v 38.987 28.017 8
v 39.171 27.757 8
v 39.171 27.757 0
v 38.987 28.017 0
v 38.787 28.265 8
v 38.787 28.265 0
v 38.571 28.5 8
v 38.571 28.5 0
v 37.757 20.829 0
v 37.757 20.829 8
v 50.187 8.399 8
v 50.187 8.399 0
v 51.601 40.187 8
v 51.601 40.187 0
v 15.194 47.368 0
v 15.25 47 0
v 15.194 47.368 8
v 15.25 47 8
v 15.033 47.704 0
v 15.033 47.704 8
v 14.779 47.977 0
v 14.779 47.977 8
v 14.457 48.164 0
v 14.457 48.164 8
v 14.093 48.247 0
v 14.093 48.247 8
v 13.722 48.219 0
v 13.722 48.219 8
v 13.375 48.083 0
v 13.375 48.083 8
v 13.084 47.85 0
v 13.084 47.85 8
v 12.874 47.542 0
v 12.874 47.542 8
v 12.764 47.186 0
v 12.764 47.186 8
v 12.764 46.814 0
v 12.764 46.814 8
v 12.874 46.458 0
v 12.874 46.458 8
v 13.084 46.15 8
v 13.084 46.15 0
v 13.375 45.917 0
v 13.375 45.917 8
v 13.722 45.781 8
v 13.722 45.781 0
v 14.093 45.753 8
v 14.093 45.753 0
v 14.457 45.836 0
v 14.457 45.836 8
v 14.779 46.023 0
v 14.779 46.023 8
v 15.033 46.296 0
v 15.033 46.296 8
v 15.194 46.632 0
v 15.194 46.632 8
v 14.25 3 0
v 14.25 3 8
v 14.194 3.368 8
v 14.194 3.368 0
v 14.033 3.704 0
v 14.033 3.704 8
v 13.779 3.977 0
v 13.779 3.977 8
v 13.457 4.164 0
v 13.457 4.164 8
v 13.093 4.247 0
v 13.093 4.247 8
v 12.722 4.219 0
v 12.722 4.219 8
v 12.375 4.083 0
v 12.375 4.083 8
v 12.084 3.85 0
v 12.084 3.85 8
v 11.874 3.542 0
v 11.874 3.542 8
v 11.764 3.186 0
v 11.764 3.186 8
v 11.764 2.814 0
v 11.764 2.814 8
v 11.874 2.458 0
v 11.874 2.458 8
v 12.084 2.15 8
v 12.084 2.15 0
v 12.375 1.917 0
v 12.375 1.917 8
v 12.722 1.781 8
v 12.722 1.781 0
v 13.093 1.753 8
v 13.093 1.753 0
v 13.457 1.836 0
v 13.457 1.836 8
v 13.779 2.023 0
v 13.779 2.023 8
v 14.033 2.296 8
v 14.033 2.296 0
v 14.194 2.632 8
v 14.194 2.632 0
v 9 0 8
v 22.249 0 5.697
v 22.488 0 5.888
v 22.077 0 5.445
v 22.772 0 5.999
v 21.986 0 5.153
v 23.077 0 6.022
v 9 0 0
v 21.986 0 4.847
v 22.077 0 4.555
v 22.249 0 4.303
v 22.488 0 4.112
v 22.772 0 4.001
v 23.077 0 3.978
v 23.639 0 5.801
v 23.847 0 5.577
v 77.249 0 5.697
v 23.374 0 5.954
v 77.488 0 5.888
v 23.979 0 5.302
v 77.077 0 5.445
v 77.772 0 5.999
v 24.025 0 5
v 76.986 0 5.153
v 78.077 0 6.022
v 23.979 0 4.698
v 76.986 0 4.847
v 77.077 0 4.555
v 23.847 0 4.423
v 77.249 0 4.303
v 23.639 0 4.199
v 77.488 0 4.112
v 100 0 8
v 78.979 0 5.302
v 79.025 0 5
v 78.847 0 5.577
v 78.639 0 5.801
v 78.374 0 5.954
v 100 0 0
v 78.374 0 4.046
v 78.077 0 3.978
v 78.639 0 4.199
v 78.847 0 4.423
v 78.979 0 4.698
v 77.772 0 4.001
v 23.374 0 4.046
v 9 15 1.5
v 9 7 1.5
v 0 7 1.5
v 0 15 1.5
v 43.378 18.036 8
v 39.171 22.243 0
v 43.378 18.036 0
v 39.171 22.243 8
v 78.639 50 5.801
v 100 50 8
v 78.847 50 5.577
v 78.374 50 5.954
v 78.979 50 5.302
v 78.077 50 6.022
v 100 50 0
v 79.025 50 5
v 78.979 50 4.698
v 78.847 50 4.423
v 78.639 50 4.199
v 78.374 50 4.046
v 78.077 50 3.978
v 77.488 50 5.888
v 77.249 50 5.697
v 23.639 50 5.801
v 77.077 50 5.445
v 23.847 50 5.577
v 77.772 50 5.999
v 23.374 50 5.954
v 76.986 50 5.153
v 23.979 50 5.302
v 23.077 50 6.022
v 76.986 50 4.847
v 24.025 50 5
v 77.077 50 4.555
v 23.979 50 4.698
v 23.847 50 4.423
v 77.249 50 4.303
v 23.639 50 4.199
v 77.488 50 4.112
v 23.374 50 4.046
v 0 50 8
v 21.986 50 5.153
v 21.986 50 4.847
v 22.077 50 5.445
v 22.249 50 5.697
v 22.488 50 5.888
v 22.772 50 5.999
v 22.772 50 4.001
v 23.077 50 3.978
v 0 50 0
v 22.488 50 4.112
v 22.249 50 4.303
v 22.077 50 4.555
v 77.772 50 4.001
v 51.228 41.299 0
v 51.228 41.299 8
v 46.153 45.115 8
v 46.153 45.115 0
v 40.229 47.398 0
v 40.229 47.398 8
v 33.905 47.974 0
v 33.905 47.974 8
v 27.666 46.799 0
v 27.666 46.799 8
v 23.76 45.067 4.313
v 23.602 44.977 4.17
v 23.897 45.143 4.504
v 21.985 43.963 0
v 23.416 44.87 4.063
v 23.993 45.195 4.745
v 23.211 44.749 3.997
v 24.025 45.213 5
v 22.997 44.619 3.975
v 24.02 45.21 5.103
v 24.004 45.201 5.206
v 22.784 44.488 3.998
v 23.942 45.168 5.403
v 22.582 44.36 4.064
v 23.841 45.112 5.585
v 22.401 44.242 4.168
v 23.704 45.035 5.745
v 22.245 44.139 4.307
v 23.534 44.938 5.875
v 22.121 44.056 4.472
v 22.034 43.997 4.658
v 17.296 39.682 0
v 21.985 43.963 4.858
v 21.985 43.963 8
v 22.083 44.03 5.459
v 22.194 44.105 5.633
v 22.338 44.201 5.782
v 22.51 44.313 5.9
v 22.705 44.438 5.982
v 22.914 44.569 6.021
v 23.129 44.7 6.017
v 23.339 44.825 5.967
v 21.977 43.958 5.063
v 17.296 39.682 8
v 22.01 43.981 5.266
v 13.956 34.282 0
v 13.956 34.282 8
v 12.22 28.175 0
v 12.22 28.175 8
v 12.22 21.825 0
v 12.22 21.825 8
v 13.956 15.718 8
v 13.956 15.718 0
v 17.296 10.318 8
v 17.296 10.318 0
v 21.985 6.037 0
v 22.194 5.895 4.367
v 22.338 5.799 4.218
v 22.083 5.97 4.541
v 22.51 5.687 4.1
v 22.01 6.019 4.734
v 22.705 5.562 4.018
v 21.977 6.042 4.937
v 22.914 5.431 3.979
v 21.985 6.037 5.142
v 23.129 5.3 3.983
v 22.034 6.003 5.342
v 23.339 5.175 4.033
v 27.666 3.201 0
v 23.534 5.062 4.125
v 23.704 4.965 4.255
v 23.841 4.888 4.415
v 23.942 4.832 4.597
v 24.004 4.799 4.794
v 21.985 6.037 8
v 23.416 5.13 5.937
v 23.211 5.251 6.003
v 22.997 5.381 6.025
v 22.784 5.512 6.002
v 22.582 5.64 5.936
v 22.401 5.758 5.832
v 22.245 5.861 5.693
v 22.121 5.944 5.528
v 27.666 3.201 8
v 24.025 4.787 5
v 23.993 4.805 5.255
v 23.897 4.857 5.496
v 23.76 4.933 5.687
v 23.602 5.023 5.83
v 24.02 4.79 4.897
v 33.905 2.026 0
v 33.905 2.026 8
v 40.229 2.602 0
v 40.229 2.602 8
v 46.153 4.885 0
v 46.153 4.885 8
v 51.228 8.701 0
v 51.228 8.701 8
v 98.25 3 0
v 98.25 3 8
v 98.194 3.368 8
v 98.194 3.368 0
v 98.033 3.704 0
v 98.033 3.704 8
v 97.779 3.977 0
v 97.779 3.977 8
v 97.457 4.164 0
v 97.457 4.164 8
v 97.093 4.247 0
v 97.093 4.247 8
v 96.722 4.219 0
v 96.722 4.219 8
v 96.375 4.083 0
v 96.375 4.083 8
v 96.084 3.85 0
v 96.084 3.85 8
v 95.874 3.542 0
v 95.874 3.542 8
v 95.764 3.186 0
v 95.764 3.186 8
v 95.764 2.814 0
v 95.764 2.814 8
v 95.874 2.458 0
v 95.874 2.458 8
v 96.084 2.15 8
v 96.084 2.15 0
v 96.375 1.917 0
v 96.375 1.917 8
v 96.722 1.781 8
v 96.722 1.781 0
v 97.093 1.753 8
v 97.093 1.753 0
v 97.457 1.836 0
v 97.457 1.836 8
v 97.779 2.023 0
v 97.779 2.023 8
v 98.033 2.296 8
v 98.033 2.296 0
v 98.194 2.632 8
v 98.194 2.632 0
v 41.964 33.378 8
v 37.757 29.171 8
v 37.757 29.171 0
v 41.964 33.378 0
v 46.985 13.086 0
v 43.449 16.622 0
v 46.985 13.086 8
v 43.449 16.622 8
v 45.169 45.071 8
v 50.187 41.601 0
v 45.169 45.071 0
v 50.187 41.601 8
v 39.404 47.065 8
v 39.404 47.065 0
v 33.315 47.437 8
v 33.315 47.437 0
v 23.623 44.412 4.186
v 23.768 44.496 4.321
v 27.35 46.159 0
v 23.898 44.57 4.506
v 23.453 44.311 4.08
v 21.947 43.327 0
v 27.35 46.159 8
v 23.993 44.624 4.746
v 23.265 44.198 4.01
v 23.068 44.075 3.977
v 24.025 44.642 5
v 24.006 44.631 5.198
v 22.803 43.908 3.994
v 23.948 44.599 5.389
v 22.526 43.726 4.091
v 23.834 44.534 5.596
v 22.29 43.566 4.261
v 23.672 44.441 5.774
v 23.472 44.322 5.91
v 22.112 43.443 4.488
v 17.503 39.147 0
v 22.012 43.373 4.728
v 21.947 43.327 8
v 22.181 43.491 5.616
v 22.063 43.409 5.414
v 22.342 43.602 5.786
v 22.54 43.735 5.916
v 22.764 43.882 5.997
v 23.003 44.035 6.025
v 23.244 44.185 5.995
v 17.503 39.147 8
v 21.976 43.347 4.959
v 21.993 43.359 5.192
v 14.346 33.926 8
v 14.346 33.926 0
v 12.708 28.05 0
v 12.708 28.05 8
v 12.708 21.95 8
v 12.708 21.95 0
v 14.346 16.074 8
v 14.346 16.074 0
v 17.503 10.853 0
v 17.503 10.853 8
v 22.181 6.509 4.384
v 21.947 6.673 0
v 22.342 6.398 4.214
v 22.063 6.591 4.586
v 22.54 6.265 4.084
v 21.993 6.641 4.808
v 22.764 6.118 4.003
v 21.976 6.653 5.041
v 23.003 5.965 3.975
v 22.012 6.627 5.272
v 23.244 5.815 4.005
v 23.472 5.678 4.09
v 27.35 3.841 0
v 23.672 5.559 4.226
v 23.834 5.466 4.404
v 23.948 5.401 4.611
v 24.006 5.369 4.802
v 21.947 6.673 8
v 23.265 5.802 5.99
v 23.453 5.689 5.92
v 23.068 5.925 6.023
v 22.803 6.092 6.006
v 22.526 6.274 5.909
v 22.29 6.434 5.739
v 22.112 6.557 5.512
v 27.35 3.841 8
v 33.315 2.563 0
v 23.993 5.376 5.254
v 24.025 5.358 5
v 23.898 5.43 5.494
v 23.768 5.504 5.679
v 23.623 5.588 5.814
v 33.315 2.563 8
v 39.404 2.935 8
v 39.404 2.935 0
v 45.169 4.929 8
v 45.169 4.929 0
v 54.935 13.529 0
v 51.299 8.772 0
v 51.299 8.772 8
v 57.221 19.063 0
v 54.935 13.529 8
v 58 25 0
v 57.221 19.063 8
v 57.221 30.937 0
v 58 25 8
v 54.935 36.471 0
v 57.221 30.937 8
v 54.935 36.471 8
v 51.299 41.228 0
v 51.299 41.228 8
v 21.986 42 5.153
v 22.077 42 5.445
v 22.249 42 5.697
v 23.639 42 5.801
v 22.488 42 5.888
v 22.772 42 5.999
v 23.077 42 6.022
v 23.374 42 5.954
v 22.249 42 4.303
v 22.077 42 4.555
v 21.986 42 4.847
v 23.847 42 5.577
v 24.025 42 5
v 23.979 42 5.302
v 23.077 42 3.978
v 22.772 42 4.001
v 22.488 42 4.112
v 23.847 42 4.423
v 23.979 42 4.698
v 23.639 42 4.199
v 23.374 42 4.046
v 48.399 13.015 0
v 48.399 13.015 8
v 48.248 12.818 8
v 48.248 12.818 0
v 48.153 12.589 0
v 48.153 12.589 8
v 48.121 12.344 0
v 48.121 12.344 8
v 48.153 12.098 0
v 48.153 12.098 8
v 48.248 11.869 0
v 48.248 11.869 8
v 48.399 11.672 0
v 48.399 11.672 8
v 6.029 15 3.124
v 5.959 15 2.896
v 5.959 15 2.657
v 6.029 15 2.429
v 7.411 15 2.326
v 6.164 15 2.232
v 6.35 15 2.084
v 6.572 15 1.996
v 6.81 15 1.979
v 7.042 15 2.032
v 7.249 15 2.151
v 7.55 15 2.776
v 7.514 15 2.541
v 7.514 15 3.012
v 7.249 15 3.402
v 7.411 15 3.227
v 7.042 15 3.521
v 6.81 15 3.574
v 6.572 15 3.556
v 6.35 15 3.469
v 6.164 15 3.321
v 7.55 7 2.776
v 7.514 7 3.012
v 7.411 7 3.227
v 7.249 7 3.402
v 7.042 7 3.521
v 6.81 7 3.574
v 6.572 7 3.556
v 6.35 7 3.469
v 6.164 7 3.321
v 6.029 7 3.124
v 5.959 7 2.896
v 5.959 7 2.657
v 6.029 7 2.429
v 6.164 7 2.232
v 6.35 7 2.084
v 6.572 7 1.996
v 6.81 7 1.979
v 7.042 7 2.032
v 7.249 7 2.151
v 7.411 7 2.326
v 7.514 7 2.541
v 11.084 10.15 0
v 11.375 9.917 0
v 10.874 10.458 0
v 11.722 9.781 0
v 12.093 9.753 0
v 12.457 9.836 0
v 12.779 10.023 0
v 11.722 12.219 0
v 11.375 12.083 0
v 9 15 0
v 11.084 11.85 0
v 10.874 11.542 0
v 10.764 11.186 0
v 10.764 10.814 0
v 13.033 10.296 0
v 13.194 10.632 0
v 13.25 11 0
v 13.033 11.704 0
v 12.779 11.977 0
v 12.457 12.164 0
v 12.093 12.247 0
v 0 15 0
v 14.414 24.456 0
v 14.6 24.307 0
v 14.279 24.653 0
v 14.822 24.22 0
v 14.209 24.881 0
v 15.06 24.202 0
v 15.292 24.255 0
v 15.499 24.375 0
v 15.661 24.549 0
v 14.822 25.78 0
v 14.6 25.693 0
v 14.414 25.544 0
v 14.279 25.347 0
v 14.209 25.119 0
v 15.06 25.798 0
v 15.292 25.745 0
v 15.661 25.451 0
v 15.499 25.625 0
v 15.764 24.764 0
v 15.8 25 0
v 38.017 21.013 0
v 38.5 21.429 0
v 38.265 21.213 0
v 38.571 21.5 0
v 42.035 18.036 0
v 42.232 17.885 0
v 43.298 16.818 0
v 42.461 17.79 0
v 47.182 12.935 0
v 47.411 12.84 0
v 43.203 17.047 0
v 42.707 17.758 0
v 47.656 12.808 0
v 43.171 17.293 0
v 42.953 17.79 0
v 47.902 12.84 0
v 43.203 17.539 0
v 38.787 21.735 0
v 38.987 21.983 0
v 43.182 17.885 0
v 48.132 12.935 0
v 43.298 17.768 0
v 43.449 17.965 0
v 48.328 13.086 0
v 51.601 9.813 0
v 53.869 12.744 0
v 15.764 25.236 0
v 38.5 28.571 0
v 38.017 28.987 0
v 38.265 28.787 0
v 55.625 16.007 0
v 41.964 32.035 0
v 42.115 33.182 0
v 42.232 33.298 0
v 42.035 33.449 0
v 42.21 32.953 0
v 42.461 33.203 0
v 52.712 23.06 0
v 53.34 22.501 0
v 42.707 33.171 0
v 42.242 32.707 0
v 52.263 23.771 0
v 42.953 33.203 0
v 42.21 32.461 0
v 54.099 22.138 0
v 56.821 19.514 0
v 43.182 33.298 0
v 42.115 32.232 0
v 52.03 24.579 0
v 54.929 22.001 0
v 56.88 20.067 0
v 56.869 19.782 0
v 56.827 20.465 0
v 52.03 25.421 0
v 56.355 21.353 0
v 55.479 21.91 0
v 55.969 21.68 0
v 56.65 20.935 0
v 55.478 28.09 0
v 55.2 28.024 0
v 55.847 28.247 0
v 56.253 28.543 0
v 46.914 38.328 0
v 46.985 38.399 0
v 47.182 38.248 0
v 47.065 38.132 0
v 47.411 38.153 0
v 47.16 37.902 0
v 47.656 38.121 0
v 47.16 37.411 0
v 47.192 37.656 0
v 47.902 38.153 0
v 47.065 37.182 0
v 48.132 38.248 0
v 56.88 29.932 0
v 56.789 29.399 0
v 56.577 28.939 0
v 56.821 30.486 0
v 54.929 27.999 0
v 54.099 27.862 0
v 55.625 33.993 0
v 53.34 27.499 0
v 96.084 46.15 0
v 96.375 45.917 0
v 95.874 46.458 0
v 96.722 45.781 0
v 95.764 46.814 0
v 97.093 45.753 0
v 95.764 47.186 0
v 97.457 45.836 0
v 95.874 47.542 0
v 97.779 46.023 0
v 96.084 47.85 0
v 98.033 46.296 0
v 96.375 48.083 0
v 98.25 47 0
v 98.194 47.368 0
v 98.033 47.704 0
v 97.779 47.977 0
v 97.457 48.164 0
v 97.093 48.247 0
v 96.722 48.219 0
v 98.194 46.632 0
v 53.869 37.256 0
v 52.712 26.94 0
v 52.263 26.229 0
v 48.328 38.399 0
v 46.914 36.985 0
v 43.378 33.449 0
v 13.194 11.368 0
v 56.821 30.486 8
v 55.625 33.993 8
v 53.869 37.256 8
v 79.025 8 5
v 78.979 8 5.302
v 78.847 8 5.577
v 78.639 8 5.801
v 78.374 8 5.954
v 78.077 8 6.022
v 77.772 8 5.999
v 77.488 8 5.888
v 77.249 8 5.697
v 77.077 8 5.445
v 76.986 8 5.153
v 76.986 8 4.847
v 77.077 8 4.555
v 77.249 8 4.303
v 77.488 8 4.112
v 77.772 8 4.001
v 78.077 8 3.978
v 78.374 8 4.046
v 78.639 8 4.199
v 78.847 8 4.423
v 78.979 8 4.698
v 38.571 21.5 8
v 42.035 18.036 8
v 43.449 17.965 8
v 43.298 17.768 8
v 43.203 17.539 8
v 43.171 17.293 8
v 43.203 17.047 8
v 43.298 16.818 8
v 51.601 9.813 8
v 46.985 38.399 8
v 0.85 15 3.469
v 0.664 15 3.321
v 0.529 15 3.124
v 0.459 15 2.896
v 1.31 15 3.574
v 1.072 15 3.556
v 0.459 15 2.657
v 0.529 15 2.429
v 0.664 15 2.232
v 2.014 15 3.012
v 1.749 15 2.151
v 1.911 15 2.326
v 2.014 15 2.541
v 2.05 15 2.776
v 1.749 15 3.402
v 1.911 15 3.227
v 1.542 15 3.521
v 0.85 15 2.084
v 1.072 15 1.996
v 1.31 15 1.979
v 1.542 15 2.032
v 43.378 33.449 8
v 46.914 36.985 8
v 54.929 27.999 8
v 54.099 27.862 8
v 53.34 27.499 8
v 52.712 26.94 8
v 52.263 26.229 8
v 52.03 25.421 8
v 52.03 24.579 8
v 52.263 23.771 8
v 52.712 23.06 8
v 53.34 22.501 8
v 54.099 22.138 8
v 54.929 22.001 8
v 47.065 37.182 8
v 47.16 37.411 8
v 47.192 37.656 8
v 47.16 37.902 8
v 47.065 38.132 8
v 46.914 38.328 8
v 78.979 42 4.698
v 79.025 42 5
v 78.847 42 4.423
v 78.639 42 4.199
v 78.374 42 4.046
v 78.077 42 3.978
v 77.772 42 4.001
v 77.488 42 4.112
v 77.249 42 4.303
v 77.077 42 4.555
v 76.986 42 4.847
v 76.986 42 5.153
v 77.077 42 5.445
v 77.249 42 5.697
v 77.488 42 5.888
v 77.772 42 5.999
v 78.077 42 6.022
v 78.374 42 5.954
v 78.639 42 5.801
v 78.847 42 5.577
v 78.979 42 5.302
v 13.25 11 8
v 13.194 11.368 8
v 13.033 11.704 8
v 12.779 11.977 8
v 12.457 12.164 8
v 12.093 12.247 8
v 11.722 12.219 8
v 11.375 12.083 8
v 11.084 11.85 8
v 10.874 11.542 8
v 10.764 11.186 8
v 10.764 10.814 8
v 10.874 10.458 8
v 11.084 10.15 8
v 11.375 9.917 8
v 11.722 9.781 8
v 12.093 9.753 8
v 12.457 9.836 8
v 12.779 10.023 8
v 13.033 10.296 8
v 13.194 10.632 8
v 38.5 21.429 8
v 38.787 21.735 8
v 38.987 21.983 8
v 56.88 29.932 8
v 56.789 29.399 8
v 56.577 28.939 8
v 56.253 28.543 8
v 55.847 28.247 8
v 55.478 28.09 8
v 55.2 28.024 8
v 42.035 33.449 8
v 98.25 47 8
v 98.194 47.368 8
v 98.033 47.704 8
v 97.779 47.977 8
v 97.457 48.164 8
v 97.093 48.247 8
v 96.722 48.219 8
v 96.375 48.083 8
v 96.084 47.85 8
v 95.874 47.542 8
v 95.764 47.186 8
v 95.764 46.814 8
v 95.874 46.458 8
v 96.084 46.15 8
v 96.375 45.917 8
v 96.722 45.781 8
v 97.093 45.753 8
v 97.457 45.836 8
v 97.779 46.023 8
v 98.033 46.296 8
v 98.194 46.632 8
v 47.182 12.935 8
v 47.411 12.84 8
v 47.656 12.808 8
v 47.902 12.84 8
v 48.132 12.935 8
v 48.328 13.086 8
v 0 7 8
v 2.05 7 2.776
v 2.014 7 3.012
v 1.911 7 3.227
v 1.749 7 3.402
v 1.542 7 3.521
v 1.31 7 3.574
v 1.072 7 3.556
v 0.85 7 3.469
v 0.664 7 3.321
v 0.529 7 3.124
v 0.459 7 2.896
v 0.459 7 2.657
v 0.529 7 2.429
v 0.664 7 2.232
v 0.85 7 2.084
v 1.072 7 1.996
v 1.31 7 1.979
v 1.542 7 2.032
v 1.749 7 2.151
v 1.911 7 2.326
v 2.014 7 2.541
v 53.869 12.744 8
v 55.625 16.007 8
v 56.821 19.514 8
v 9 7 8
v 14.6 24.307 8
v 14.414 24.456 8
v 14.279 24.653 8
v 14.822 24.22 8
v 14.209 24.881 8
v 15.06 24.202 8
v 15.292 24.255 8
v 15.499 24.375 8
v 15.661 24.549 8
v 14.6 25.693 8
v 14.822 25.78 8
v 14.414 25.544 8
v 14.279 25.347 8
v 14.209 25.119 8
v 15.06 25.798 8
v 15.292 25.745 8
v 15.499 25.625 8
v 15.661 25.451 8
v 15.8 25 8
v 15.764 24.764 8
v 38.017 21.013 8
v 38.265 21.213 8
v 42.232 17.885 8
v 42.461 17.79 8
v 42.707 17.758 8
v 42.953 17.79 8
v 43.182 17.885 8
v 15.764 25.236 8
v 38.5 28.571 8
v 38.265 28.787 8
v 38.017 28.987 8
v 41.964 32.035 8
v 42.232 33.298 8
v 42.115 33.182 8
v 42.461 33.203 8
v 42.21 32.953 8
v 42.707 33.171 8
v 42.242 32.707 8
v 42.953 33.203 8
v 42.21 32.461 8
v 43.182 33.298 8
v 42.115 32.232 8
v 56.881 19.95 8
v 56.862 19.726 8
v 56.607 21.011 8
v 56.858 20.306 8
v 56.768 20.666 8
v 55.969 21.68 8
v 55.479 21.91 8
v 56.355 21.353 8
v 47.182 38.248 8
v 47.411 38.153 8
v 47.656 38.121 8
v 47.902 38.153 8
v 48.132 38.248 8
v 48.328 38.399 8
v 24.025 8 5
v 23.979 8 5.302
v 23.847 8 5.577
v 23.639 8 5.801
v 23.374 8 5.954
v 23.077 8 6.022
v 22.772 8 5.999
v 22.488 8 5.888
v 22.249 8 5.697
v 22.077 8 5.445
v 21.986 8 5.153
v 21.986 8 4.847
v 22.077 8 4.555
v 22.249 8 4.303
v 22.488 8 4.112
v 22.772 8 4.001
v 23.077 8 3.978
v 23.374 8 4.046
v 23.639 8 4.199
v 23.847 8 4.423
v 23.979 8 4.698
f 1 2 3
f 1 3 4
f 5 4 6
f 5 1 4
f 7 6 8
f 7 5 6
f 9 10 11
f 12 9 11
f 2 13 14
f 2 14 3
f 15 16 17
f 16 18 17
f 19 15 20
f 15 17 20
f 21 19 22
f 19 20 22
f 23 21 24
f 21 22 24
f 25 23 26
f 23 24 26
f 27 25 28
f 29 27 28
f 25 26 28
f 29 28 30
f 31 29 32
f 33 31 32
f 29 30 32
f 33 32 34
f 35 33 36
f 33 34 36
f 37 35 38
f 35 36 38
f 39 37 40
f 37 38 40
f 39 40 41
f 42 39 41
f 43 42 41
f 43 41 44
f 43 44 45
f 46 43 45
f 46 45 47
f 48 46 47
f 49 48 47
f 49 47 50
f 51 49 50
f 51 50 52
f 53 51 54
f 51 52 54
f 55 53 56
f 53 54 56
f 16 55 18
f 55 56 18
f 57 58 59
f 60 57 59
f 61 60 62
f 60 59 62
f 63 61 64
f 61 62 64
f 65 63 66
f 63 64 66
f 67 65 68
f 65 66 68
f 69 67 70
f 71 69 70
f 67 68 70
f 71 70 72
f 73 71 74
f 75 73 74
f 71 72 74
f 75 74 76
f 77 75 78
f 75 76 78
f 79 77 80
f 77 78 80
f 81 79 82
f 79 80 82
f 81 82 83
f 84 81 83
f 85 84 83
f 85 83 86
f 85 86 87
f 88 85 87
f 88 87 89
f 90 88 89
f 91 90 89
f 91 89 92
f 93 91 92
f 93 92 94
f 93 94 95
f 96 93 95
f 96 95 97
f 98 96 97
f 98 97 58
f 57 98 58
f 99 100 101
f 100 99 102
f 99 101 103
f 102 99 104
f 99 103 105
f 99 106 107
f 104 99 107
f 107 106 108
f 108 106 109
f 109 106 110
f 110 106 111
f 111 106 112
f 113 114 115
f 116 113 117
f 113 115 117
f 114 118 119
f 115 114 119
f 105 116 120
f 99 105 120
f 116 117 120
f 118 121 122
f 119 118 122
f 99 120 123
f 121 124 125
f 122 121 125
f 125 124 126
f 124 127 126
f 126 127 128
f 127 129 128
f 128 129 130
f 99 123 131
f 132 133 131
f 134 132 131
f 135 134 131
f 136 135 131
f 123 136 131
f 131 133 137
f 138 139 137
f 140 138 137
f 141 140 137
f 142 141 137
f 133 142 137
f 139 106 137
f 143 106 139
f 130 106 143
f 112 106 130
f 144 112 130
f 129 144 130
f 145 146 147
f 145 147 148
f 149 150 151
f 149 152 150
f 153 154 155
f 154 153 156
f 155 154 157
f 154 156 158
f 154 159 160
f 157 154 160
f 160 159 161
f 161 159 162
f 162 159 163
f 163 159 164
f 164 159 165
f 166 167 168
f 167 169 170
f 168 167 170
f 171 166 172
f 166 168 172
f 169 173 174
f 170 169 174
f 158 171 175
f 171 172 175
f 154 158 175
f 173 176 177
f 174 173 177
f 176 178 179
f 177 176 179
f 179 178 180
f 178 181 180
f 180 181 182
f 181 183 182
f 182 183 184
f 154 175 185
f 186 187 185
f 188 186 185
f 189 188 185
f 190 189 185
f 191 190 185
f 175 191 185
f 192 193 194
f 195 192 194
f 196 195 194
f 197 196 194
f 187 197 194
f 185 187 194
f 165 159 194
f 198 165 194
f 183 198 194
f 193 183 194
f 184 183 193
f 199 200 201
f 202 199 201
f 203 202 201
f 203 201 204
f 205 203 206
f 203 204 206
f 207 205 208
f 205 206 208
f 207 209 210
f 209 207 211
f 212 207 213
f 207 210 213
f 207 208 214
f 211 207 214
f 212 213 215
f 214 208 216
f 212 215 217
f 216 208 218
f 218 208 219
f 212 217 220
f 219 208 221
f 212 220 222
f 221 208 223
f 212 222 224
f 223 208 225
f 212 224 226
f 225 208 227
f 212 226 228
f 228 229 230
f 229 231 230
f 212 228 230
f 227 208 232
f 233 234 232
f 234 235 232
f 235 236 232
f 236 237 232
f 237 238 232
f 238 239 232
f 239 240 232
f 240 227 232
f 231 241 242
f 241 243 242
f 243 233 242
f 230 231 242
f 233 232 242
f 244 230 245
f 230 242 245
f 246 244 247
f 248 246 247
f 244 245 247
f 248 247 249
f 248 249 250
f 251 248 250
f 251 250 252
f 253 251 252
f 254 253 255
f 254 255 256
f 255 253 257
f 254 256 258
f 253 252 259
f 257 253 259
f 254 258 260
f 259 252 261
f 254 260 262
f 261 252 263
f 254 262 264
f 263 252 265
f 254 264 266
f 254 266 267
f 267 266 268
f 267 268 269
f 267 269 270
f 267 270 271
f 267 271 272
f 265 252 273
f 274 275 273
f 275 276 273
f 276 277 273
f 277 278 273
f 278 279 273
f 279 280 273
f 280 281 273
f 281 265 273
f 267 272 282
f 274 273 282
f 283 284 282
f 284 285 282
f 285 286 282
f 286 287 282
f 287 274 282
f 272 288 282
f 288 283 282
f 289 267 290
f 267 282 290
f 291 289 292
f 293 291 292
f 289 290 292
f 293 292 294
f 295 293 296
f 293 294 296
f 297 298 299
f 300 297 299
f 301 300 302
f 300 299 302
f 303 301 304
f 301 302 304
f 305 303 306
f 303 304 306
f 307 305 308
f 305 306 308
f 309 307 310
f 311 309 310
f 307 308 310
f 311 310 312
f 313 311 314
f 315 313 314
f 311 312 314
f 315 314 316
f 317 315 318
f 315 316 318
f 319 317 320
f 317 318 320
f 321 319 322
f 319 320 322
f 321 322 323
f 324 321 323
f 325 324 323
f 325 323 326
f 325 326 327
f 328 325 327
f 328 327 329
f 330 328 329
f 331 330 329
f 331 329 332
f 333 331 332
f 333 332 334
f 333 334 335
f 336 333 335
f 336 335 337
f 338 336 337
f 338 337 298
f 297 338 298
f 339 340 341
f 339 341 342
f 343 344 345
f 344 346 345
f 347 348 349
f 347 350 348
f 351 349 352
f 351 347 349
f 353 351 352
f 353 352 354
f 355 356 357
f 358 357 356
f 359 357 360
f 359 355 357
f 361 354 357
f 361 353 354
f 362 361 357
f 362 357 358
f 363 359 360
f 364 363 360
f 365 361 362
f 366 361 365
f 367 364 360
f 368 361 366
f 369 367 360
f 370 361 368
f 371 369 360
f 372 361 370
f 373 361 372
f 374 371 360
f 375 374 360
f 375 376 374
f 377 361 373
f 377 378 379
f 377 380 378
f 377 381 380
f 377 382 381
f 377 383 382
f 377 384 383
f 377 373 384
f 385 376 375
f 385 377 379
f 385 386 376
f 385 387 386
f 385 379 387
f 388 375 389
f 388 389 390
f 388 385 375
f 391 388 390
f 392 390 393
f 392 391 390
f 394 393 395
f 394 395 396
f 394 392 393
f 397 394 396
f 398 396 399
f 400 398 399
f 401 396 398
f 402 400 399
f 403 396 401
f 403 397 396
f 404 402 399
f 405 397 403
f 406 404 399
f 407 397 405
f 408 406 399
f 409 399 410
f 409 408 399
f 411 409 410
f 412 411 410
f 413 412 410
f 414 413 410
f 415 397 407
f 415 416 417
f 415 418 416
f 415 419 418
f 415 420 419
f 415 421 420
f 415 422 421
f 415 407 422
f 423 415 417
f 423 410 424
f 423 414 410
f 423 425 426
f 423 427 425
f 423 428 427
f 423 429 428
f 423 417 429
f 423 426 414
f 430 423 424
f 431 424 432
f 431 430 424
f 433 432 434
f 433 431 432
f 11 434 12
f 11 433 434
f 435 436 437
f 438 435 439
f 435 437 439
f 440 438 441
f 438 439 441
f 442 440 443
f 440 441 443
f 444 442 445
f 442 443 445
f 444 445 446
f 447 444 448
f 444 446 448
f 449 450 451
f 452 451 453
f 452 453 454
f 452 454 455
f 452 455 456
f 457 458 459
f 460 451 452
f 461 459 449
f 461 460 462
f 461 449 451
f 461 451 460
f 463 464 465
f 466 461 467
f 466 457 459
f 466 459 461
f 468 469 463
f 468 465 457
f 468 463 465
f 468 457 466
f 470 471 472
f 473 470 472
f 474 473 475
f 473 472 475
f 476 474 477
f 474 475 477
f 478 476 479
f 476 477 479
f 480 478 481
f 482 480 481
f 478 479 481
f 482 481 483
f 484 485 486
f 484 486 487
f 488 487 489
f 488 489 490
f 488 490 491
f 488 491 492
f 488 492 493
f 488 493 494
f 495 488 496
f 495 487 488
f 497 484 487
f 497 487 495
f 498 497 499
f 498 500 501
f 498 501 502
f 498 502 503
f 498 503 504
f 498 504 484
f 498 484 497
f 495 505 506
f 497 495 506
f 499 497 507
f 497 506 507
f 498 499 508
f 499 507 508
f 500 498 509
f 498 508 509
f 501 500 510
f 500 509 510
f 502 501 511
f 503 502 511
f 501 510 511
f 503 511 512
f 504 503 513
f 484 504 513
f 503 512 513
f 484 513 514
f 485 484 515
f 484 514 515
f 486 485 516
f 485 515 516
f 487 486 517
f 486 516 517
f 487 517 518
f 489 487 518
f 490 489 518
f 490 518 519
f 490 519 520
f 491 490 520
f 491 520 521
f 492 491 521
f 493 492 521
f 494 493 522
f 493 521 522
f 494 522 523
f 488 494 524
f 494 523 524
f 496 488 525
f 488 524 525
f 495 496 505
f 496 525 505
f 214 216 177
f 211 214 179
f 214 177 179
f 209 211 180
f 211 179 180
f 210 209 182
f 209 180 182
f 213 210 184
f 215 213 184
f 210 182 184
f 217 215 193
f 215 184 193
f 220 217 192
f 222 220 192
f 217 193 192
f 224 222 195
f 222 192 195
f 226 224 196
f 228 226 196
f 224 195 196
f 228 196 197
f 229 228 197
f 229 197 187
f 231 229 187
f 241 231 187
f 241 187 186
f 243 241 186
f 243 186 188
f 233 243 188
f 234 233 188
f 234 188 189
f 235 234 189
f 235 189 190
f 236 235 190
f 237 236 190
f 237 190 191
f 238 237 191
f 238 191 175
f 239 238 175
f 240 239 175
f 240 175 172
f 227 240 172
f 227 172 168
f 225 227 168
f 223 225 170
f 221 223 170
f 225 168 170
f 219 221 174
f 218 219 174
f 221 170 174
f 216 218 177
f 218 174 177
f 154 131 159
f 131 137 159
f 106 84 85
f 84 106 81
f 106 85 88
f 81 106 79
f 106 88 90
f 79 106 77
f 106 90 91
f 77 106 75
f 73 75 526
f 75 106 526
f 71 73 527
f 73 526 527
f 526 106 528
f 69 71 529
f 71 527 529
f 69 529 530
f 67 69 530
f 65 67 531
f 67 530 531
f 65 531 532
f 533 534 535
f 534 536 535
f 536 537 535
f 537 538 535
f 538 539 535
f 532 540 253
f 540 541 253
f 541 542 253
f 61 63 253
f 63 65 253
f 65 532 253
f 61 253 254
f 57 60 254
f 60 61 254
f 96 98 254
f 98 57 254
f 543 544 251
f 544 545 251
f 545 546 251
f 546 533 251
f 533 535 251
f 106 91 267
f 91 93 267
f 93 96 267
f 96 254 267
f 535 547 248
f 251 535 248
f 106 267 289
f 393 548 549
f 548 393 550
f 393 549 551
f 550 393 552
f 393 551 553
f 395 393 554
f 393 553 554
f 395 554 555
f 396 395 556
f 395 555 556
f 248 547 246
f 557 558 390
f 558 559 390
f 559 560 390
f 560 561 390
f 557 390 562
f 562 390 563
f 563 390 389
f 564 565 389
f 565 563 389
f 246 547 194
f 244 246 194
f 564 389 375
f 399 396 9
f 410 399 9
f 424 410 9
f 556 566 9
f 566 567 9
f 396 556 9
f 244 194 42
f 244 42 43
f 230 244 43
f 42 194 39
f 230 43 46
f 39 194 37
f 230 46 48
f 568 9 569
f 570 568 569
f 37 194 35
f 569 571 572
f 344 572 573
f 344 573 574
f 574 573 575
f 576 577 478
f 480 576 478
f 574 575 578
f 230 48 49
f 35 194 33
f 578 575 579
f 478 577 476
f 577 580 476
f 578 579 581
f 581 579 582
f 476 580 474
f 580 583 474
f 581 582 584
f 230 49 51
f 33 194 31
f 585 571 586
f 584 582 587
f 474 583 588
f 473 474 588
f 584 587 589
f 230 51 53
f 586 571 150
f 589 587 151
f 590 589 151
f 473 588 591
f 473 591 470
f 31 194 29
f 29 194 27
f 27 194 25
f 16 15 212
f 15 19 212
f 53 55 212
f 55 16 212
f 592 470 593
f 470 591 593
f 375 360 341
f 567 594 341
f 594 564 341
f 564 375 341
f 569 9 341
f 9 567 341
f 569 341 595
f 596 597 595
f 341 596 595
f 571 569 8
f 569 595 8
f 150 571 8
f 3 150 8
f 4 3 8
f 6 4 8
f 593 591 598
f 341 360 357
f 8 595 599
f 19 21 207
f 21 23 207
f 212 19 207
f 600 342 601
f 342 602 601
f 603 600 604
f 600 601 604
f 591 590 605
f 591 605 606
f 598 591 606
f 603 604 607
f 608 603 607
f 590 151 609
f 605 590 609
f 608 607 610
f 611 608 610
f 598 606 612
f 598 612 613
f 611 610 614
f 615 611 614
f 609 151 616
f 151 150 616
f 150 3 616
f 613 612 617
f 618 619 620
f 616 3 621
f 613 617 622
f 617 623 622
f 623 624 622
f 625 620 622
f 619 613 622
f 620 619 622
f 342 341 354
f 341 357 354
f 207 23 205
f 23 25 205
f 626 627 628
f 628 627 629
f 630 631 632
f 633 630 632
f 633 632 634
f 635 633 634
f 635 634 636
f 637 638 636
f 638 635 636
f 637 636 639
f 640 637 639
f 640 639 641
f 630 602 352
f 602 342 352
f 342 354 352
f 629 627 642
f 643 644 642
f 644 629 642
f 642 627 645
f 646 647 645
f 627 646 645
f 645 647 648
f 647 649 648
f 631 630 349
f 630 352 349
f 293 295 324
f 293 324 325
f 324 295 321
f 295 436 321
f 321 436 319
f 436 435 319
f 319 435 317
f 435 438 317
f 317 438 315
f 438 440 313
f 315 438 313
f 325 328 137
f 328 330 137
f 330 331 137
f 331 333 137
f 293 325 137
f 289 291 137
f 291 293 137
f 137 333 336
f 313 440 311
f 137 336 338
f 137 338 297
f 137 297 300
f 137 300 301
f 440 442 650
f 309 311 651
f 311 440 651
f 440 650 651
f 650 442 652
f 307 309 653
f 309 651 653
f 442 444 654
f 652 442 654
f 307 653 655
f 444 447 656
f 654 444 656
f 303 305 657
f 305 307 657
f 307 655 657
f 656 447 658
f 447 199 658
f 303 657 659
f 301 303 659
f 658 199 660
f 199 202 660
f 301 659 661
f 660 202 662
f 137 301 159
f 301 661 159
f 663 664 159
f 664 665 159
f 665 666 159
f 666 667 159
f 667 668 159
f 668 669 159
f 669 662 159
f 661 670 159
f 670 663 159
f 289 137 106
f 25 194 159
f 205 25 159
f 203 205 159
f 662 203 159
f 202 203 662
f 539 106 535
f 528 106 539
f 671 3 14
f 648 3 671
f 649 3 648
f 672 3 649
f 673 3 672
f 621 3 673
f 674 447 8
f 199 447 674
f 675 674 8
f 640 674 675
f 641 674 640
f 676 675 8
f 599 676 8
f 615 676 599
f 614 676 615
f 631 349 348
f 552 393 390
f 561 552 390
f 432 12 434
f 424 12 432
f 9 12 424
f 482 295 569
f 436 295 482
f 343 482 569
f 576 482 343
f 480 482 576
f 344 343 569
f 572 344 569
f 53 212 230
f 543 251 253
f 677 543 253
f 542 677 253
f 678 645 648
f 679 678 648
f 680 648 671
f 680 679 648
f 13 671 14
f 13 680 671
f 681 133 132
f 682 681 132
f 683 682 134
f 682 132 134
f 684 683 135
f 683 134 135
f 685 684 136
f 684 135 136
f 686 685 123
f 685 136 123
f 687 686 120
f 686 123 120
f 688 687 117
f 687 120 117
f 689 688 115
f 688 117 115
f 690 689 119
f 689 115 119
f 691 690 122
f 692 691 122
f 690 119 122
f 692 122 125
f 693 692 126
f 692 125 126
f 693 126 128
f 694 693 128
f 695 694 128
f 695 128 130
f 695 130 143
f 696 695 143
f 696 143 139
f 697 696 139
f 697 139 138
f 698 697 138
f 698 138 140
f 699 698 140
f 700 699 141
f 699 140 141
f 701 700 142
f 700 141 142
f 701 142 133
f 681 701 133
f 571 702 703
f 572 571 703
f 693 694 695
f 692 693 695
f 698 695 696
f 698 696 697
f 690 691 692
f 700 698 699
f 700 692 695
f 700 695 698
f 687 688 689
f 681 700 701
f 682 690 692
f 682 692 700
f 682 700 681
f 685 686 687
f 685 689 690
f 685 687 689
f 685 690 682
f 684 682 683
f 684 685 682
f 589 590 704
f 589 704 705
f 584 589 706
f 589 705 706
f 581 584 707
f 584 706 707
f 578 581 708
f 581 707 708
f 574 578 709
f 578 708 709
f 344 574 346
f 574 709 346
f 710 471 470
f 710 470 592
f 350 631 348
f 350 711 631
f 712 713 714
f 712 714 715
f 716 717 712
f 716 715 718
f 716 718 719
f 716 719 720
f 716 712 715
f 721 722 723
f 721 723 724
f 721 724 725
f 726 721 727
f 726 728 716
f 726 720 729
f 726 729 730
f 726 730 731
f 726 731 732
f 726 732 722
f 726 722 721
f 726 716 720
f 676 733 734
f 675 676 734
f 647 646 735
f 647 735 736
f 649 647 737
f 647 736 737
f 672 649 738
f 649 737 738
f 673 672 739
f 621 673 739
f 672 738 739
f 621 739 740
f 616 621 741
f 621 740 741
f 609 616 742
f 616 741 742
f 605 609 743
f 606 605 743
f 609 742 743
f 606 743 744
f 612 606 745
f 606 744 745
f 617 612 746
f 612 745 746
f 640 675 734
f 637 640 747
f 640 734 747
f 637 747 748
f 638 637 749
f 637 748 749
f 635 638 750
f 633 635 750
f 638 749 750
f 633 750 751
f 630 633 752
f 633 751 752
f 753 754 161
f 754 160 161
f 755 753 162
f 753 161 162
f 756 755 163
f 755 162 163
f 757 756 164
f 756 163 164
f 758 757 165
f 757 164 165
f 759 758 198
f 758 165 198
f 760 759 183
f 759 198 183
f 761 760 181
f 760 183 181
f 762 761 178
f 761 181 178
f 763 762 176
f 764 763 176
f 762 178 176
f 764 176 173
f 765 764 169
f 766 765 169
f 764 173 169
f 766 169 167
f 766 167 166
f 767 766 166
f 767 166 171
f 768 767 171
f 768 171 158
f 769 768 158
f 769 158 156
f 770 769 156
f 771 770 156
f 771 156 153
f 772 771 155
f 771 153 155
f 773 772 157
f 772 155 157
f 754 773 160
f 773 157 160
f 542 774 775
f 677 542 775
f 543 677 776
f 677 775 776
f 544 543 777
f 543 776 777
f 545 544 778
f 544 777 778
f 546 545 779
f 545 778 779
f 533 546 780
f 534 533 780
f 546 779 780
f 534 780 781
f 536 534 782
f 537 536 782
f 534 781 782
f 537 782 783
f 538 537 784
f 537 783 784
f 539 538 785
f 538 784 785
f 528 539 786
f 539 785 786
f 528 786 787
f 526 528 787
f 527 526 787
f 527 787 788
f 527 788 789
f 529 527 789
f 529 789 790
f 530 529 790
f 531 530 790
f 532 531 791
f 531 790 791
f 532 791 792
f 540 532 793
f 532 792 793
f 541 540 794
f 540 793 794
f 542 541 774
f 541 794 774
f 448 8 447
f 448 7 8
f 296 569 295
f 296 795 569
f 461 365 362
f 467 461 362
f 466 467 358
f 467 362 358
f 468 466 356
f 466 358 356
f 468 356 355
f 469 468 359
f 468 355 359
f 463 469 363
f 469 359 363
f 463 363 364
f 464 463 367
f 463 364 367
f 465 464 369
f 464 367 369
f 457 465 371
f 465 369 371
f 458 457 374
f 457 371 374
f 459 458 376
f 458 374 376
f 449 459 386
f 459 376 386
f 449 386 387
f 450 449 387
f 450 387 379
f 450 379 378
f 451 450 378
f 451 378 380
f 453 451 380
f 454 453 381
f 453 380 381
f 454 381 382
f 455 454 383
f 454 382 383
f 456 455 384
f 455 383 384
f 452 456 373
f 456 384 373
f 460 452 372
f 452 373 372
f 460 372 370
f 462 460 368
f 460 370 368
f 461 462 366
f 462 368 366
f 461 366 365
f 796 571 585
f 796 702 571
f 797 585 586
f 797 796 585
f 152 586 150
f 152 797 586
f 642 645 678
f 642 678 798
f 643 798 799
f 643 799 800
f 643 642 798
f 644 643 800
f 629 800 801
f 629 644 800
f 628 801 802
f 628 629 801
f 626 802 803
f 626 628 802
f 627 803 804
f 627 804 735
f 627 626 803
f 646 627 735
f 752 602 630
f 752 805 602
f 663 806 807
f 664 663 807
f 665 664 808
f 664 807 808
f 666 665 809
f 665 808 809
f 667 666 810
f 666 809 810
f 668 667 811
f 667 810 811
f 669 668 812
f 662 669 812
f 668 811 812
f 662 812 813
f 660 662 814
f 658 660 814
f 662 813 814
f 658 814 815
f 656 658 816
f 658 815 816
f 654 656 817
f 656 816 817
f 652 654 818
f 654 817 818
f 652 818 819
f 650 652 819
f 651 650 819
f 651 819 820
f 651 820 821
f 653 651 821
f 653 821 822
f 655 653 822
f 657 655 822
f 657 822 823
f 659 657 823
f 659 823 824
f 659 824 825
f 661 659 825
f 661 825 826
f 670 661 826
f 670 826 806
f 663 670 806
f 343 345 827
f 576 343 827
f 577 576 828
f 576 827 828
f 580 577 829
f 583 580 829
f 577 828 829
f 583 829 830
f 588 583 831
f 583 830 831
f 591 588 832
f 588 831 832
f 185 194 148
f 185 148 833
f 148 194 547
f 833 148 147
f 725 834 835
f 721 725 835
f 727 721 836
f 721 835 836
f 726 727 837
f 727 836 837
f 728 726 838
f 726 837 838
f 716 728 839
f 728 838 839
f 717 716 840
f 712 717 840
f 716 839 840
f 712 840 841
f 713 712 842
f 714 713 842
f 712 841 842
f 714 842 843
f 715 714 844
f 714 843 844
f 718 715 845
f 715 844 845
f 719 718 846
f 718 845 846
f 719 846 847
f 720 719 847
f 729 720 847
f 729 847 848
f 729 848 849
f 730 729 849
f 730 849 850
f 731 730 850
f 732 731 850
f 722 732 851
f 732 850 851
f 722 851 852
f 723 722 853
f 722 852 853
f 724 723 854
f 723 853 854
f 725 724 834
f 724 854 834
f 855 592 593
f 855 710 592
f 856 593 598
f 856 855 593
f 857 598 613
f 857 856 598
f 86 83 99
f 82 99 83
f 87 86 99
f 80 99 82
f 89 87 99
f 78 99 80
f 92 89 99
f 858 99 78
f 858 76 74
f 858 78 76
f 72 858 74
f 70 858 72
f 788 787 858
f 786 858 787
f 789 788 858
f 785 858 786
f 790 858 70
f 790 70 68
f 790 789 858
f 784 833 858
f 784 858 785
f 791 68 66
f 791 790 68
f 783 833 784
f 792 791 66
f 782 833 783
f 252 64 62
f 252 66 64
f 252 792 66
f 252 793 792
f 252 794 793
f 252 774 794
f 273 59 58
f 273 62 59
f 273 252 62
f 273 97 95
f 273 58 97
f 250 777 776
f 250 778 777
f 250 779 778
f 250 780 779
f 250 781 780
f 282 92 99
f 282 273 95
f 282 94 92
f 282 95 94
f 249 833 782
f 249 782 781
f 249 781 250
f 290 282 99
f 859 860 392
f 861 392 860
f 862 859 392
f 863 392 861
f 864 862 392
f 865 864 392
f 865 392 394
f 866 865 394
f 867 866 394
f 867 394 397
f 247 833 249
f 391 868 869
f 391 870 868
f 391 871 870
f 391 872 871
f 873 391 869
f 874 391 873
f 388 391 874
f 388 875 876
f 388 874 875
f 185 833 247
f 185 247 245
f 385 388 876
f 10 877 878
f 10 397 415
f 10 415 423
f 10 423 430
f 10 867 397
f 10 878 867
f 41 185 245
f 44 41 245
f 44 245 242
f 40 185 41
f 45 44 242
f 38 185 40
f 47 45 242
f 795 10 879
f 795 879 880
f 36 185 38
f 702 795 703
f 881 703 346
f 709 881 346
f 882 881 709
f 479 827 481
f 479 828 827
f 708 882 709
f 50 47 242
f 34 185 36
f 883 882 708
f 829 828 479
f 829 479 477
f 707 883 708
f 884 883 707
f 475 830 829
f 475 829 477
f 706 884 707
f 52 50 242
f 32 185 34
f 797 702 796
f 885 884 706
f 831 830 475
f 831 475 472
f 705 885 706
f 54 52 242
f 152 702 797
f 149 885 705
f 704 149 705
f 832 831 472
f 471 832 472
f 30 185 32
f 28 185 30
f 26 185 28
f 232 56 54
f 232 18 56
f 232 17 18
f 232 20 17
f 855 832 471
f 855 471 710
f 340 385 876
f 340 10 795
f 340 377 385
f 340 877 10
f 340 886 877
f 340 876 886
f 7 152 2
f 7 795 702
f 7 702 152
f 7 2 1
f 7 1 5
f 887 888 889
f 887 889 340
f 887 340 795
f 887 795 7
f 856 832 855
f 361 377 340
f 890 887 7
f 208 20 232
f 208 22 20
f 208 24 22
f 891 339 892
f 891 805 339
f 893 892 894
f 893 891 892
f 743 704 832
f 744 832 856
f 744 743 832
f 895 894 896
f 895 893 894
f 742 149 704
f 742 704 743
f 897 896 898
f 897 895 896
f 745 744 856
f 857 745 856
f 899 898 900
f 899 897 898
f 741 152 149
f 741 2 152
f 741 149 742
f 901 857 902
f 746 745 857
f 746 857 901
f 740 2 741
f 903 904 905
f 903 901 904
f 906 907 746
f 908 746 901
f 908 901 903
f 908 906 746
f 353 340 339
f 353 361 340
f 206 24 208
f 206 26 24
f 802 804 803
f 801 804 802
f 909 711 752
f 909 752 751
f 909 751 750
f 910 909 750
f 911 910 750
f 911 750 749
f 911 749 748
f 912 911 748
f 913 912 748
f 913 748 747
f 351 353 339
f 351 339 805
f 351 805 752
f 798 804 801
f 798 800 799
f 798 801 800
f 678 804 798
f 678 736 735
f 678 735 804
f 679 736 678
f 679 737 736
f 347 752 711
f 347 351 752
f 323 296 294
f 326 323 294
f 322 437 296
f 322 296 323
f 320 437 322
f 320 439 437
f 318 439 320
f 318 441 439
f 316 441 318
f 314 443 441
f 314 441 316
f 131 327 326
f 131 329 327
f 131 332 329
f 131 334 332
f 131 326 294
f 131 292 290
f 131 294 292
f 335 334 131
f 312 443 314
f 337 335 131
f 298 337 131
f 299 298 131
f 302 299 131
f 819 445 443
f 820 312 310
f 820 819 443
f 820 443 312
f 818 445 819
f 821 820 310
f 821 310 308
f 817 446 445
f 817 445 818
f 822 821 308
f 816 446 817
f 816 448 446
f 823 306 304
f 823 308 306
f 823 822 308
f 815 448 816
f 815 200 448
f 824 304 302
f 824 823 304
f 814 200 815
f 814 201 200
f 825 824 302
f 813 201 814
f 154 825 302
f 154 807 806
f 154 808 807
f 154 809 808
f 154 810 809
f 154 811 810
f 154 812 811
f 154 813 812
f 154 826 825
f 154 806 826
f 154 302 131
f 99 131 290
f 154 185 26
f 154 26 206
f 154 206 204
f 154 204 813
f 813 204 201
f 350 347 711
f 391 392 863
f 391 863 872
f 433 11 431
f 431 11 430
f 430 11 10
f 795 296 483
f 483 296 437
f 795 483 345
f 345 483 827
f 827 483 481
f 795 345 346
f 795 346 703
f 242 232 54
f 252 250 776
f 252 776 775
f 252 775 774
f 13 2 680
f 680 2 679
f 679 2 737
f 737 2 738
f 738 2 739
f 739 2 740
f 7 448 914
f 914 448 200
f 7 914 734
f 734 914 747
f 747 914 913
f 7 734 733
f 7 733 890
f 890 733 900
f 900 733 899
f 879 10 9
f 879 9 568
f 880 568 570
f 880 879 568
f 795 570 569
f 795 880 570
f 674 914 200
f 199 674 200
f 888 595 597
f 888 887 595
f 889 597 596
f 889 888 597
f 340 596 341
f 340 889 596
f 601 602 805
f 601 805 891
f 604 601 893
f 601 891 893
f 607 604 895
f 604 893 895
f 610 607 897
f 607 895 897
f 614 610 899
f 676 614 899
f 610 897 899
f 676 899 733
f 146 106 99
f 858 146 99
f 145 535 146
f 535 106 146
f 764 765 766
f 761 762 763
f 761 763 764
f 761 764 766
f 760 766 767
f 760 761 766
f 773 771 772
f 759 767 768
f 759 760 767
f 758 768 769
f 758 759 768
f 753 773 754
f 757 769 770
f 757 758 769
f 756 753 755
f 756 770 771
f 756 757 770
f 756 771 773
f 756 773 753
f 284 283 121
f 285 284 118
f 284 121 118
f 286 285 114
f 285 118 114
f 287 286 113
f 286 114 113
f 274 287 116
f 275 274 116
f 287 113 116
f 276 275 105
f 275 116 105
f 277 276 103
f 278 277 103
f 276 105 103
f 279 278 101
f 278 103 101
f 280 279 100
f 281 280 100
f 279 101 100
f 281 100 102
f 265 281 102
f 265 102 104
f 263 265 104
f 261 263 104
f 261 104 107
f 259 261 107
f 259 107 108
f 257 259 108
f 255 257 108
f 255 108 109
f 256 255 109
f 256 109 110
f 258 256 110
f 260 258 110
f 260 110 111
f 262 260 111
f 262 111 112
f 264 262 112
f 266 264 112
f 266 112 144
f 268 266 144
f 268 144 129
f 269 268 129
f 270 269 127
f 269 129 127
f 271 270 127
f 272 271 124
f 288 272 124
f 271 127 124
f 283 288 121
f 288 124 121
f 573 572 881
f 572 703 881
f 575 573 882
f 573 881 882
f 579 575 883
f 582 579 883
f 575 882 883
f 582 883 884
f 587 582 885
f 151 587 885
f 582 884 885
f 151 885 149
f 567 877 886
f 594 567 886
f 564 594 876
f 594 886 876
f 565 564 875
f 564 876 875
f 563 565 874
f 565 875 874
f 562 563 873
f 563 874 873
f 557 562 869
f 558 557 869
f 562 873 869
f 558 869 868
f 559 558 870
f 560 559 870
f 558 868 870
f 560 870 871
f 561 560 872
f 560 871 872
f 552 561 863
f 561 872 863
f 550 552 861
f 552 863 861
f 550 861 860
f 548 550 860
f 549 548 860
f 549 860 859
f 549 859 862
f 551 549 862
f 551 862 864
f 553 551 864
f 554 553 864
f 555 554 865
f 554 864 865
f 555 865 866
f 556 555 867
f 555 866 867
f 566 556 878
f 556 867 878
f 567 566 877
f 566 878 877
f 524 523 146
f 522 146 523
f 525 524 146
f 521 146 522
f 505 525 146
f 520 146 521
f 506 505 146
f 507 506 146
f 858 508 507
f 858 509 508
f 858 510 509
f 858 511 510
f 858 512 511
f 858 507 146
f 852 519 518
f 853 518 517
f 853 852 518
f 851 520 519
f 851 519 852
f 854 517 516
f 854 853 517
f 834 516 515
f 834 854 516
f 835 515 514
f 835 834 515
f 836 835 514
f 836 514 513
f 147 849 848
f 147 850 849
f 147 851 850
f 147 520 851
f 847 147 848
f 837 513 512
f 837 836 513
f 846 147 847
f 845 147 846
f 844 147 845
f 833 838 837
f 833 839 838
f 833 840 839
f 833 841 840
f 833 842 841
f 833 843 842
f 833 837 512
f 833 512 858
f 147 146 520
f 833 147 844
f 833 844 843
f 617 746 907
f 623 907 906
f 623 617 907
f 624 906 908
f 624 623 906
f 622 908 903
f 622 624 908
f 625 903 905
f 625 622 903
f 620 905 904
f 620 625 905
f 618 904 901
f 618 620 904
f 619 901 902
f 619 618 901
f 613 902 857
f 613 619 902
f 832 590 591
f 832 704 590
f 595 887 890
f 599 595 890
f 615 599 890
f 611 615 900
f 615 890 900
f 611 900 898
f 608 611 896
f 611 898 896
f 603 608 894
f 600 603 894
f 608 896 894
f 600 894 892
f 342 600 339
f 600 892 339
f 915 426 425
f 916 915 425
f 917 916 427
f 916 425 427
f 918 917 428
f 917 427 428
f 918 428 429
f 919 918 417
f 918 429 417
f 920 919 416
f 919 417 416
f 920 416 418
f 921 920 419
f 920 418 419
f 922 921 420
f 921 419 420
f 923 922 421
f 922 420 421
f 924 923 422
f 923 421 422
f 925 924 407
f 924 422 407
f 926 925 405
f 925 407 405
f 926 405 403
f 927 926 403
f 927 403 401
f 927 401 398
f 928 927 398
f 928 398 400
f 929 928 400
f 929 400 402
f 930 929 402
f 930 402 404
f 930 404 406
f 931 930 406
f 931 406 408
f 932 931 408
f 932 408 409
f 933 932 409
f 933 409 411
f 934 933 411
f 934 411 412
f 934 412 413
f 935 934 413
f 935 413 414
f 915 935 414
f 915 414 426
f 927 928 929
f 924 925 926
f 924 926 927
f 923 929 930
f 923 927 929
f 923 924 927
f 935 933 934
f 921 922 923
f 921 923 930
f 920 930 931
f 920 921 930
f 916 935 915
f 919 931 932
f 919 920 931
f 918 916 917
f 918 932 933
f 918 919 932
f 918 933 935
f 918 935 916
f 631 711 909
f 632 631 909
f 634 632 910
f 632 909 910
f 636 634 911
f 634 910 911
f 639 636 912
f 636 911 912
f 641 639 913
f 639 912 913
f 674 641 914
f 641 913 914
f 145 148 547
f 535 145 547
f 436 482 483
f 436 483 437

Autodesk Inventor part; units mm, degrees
ref_plane "YZ Plane" through (0, 0, 0) normal (1, 0, 0) x (0, 1, 0)
ref_plane "XZ Plane" through (0, 0, 0) normal (0, 1, 0) x (-1, 0, 0)
ref_plane "XY Plane" through (0, 0, 0) normal (0, 0, 1) x (1, 0, 0)
sketch "Sketch1" plane through (0, 0, 0) normal (0, 0, 1) x (1, 0, 0)
  line L0 (0, 0) -> (100, 0)
  line L1 (100, 0) -> (100, 50)
  line L2 (100, 50) -> (0, 50)
  line L3 (0, 50) -> (0, 0)
  circle A0 centre (95, 45) radius 1.75
  circle A1 centre (95, 5) radius 1.75
  circle A2 centre (15, 45) radius 1.75
  circle A3 centre (15, 5) radius 1.75
  dimension "d0" = 50
  dimension "d1" = 100
  dimension "d2" = 5
  dimension "d3" = 5
  dimension "d4" = 5
  dimension "d5" = 5
  dimension "d6" = 5
  dimension "d7" = 15
  dimension "d8" = 15
  dimension "d9" = 5
  dimension "d10" = 3.5
  dimension "d11" = 3.5
  dimension "d12" = 3.5
  dimension "d13" = 3.5
extrude "Extrusion1" add sketch "Sketch1" along normal blind 8 contours L3 L2 L1 L0 | A0 | A1 | A2 | A3
sketch "Sketch4" plane through (0, 0, 8) normal (0, 0, 1) x (1, 0, 0)
  circle A0 centre (15, 25) radius 0.8
  circle A1 centre (55, 25) radius 3
  line L0 (0, 50) -> (0, 0) projected
  line L1 (35, 25) -> (52.9141, 42.9141)
  line L2 (35, 25) -> (41.4896, 25)
  line L3 (35, 25) -> (55.1987, 4.8013)
  circle A2 centre (35, 25) radius 23
  line L4 (0, 0) -> (100, 0) projected
  circle A3 centre (35, 25) radius 5
  line L5 (38.5, 28.5707) -> (51.2281, 41.2988)
  line L6 (37.757, 29.1712) -> (50.1871, 41.6013)
  line L7 (38.5707, 28.5) -> (51.2988, 41.2281)
  line L8 (51.6013, 40.1871) -> (39.1712, 27.757)
  line L9 (38.5707, 21.5) -> (51.2988, 8.7719)
  line L10 (38.5, 21.4293) -> (51.2281, 8.7012)
  line L11 (37.757, 20.8288) -> (50.1871, 8.3987)
  line L12 (39.1712, 22.243) -> (51.6013, 9.8129)
  arc A4 (51.6013, 9.8129) -> (50.1871, 8.3987) centre (35, 25) ccw
  circle A5 centre (41.2925, 32.7067) radius 0.95
  circle A6 centre (42.7067, 34.121) radius 0.95
  circle A7 centre (46.2423, 37.6565) radius 0.95
  circle A8 centre (47.6565, 39.0707) radius 0.95
  circle A9 centre (42.7067, 18.7075) radius 0.95
  circle A10 centre (44.121, 17.2933) radius 0.95
  circle A11 centre (47.6565, 13.7577) radius 0.95
  circle A12 centre (49.0707, 12.3435) radius 0.95
  point P0 (0, 15)
  point P1 (7, 0)
  point P2 (57.4312, 26.7576)
  point P3 (57.4312, 23.2424)
  point P4 (58, 25)
  point P5 (50.9452, 40.8745)
  point P6 (50.8745, 40.9452)
  point P7 (41.9643, 32.035)
  point P8 (41.9643, 33.3785)
  point P9 (42.035, 33.4492)
  point P10 (43.3785, 33.4492)
  point P11 (46.914, 36.9847)
  point P12 (46.914, 38.3282)
  point P13 (48.3282, 38.399)
  point P14 (46.9847, 38.399)
  point P15 (42.035, 18.0357)
  point P16 (43.3785, 18.0357)
  point P17 (43.4492, 17.965)
  point P18 (43.4492, 16.6215)
  point P19 (46.9847, 13.086)
  point P20 (48.3282, 13.086)
  point P21 (48.399, 13.0153)
  point P22 (48.399, 11.6718)
  dimension "d34" = 10
  dimension "d22" = 15
  dimension "d23" = 40
  dimension "d24" = 20
  dimension "d26" = 1.6
  dimension "d27" = 6
  dimension "d28" = 45
  dimension "d29" = 45
  dimension "d30" = 46
  dimension "d31" = 25
  dimension "d32" = 25
  dimension "d33" = 25
  dimension "d35" = 1
  dimension "d36" = 1
  dimension "d37" = 0.1
  dimension "d38" = 0.05
  dimension "d39" = 0.1
  dimension "d40" = 0.05
  dimension "d41" = 1
  dimension "d42" = 1
  dimension "d79" = 5
  dimension "d80" = 2
  dimension "d81" = 5
  dimension "d82" = 2
  dimension "d83" = 5
  dimension "d84" = 2
  dimension "d85" = 5
  dimension "d86" = 2
extrude "Extrusion4" cut sketch "Sketch4" against normal blind 8 contours A0 | A1 A4 | A2 L9 A12 L12 A4 A1 | A1 A4 L7 A2 | A4 A1 | L8 A3 L7 A4 | A12 L12 | L5 A4 L11 A3 L10 A2 | L9 A10 L12 A11 | A11 L12 | L5 A8 L6 A4 | A3 L12 A9 L9 | A10 L12 | A3 L6 A5 L5 | A8 L6 | A9 L12 | A5 L6 | L5 A6 L6 A7 | A7 L6 | A6 L6 picked at (49.0352, 12.0288) picked at (47.3576, 13.4145) picked at (44.1564, 16.9786) picked at (47.9671, 39.0089) picked at (42.6021, 18.4086) picked at (41.6092, 32.7067) picked at (46.2068, 37.3418) picked at (43.0173, 33.7349)
fillet "Fillet2" radius 2 2 edges at (57.4312, 26.7576, 4) (57.4312, 23.2424, 4)
sketch "Sketch5" plane through (0, 0, 0) normal (-1, 0, 0) x (0, 0, 1)
  line L0 (0, 0) -> (1.5, 0)
  line L1 (1.5, 0) -> (1.5, 15)
  line L2 (1.5, 15) -> (0, 15)
  line L3 (0, 15) -> (0, 0)
  line L4 (8, 0) -> (8, 50) projected
  line L5 (8, 0) -> (1.5, 0)
  line L6 (1.5, 0) -> (1.5, 7)
  line L7 (1.5, 7) -> (8, 7)
  line L8 (8, 7) -> (8, 0)
  dimension "d47" = 15
  dimension "d48" = 1.5
  dimension "d51" = 7
extrude "Extrusion5" cut sketch "Sketch5" against normal blind 9
sketch "Sketch6" plane through (0, 7, 1.5) normal (0, -1, 0) x (1, 0, 0)
  circle A0 centre (6.75, 1.2764) radius 1.1 projected
  circle A1 centre (1.25, 1.2764) radius 1.1 projected
  circle A2 centre (6.75, 1.2764) radius 0.8
  circle A3 centre (1.25, 1.2764) radius 0.8
  point P0 (0, -1.5)
  dimension "d52" = 1.6
  dimension "d53" = 1.6
extrude "Extrusion6" cut sketch "Sketch6" against normal blind 8 contours A2 | A3
sketch "Sketch7" plane through (0, 0, 8) normal (0, 0, 1) x (1, 0, 0)
  circle A0 centre (97, 3) radius 1.7 projected
  circle A1 centre (97, 47) radius 1.7 projected
  circle A2 centre (12, 11) radius 1.7 projected
  circle A3 centre (21.5, 47.5) radius 1.7 projected
  circle A4 centre (97, 3) radius 1.25
  circle A5 centre (97, 47) radius 1.25
  circle A6 centre (13, 3) radius 1.25
  circle A7 centre (12, 11) radius 1.25
  circle A8 centre (21.5, 47.5) radius 1.25
  circle A9 centre (14, 47) radius 1.7
  circle A10 centre (14, 47) radius 1.25
  line L0 (9, 0) -> (100, 0) projected
  line L1 (9, 0) -> (9, 15) projected
  point P0 (0, 0)
  dimension "d56" = 2.5
  dimension "d57" = 2.5
  dimension "d58" = 2.5
  dimension "d59" = 2.5
  dimension "d60" = 2.5
  dimension "d63" = 2.5
  dimension "d64" = 3
  dimension "d65" = 4
extrude "Extrusion7" cut sketch "Sketch7" against normal blind 8 contours A4 | A5 | A6 | A7 | A10
sketch "Sketch8" plane through (0, 50, 0) normal (0, 1, 0) x (1, 0, 0)
  circle A0 centre (23, -5) radius 1.375
  circle A1 centre (78, -5) radius 1.375
  circle A2 centre (23, -5) radius 1.025
  circle A3 centre (78, -5) radius 1.025
  line L0 (0, 0) -> (0, -8) projected
  dimension "d68" = 2.05
  dimension "d69" = 2.05
  dimension "d74" = 23
  dimension "d75" = 23
  dimension "d76" = 55
extrude "Extrusion8" cut sketch "Sketch8" against normal blind 8 contours A2 | A3
sketch "Sketch9" plane through (100, 0, 0) normal (0, -1, 0) x (1, 0, 0)
  circle A0 centre (-77, 5) radius 1.375
  circle A1 centre (-22, 5) radius 1.375
  circle A2 centre (-77, 5) radius 1.025
  circle A3 centre (-22, 5) radius 1.025
  line L0 (-100, 1.5) -> (-100, 8) projected
  point P0 (-100, 0)
  dimension "d70" = 2.05
  dimension "d71" = 2.05
  dimension "d77" = 23
  dimension "d78" = 55
extrude "Extrusion9" cut sketch "Sketch9" against normal blind 8 contours A2 | A3
equation "\"d4\" = d3"
equation "\"d5\" = d2"
equation "\"d6\" = d3"
equation "\"d9\" = d4"
equation "\"d10\" = d11"
equation "\"d12\" = d11"
equation "\"d13\" = d11"
equation "\"d24\" = 0.5 * d23"
equation "\"d37\" = BladeThicknessRCC"
equation "\"d38\" = 0.5 * d37"
equation "\"d39\" = BladeThicknessRCC"
equation "\"d40\" = 0.5 * BladeThicknessRCC"
equation "\"d59\" = d58"
equation "\"d60\" = d59"
equation "\"d75\" = d74"
equation "\"bladeThicknessTablePushing\" = 0.1"
equation "\"bladeThicknessTable\" = 0.1"
equation "\"bladeThicknessForceConverter\" = 0.2"
equation "\"bladeThicknessWheelAnchor\" = 0.1"
equation "\"safetyPlay\" = 0.1"
equation "\"OffsetMotorSpring\" = -1"
equation "\"BladeThicknessRCC\" = 0.1"
equation "\"bladeThicknessZeroConverter\" = 0.1"
equation "\"rangeXProbeMin\" = -0.6"
equation "\"thicknessWheelPlate\" = 8"
equation "\"rangeXProbeMax\" = 0.6"
equation "\"BladeLengthRCC\" = 18"
equation "\"bladeLengthTable\" = 18"
equation "\"bladeLengthWheelAnchor\" = 7.5"
equation "\"RCCdeadCenter\" = 5"
equation "\"bladeLengthZeroConverter\" = 11.98"
equation "\"bladeLengthTablePushing\" = 12"
equation "\"bladeLengthForceConverter\" = 12.125"
equation "\"thicknessConverterPlate\" = 4"
properties part number "RoueV3partA"
